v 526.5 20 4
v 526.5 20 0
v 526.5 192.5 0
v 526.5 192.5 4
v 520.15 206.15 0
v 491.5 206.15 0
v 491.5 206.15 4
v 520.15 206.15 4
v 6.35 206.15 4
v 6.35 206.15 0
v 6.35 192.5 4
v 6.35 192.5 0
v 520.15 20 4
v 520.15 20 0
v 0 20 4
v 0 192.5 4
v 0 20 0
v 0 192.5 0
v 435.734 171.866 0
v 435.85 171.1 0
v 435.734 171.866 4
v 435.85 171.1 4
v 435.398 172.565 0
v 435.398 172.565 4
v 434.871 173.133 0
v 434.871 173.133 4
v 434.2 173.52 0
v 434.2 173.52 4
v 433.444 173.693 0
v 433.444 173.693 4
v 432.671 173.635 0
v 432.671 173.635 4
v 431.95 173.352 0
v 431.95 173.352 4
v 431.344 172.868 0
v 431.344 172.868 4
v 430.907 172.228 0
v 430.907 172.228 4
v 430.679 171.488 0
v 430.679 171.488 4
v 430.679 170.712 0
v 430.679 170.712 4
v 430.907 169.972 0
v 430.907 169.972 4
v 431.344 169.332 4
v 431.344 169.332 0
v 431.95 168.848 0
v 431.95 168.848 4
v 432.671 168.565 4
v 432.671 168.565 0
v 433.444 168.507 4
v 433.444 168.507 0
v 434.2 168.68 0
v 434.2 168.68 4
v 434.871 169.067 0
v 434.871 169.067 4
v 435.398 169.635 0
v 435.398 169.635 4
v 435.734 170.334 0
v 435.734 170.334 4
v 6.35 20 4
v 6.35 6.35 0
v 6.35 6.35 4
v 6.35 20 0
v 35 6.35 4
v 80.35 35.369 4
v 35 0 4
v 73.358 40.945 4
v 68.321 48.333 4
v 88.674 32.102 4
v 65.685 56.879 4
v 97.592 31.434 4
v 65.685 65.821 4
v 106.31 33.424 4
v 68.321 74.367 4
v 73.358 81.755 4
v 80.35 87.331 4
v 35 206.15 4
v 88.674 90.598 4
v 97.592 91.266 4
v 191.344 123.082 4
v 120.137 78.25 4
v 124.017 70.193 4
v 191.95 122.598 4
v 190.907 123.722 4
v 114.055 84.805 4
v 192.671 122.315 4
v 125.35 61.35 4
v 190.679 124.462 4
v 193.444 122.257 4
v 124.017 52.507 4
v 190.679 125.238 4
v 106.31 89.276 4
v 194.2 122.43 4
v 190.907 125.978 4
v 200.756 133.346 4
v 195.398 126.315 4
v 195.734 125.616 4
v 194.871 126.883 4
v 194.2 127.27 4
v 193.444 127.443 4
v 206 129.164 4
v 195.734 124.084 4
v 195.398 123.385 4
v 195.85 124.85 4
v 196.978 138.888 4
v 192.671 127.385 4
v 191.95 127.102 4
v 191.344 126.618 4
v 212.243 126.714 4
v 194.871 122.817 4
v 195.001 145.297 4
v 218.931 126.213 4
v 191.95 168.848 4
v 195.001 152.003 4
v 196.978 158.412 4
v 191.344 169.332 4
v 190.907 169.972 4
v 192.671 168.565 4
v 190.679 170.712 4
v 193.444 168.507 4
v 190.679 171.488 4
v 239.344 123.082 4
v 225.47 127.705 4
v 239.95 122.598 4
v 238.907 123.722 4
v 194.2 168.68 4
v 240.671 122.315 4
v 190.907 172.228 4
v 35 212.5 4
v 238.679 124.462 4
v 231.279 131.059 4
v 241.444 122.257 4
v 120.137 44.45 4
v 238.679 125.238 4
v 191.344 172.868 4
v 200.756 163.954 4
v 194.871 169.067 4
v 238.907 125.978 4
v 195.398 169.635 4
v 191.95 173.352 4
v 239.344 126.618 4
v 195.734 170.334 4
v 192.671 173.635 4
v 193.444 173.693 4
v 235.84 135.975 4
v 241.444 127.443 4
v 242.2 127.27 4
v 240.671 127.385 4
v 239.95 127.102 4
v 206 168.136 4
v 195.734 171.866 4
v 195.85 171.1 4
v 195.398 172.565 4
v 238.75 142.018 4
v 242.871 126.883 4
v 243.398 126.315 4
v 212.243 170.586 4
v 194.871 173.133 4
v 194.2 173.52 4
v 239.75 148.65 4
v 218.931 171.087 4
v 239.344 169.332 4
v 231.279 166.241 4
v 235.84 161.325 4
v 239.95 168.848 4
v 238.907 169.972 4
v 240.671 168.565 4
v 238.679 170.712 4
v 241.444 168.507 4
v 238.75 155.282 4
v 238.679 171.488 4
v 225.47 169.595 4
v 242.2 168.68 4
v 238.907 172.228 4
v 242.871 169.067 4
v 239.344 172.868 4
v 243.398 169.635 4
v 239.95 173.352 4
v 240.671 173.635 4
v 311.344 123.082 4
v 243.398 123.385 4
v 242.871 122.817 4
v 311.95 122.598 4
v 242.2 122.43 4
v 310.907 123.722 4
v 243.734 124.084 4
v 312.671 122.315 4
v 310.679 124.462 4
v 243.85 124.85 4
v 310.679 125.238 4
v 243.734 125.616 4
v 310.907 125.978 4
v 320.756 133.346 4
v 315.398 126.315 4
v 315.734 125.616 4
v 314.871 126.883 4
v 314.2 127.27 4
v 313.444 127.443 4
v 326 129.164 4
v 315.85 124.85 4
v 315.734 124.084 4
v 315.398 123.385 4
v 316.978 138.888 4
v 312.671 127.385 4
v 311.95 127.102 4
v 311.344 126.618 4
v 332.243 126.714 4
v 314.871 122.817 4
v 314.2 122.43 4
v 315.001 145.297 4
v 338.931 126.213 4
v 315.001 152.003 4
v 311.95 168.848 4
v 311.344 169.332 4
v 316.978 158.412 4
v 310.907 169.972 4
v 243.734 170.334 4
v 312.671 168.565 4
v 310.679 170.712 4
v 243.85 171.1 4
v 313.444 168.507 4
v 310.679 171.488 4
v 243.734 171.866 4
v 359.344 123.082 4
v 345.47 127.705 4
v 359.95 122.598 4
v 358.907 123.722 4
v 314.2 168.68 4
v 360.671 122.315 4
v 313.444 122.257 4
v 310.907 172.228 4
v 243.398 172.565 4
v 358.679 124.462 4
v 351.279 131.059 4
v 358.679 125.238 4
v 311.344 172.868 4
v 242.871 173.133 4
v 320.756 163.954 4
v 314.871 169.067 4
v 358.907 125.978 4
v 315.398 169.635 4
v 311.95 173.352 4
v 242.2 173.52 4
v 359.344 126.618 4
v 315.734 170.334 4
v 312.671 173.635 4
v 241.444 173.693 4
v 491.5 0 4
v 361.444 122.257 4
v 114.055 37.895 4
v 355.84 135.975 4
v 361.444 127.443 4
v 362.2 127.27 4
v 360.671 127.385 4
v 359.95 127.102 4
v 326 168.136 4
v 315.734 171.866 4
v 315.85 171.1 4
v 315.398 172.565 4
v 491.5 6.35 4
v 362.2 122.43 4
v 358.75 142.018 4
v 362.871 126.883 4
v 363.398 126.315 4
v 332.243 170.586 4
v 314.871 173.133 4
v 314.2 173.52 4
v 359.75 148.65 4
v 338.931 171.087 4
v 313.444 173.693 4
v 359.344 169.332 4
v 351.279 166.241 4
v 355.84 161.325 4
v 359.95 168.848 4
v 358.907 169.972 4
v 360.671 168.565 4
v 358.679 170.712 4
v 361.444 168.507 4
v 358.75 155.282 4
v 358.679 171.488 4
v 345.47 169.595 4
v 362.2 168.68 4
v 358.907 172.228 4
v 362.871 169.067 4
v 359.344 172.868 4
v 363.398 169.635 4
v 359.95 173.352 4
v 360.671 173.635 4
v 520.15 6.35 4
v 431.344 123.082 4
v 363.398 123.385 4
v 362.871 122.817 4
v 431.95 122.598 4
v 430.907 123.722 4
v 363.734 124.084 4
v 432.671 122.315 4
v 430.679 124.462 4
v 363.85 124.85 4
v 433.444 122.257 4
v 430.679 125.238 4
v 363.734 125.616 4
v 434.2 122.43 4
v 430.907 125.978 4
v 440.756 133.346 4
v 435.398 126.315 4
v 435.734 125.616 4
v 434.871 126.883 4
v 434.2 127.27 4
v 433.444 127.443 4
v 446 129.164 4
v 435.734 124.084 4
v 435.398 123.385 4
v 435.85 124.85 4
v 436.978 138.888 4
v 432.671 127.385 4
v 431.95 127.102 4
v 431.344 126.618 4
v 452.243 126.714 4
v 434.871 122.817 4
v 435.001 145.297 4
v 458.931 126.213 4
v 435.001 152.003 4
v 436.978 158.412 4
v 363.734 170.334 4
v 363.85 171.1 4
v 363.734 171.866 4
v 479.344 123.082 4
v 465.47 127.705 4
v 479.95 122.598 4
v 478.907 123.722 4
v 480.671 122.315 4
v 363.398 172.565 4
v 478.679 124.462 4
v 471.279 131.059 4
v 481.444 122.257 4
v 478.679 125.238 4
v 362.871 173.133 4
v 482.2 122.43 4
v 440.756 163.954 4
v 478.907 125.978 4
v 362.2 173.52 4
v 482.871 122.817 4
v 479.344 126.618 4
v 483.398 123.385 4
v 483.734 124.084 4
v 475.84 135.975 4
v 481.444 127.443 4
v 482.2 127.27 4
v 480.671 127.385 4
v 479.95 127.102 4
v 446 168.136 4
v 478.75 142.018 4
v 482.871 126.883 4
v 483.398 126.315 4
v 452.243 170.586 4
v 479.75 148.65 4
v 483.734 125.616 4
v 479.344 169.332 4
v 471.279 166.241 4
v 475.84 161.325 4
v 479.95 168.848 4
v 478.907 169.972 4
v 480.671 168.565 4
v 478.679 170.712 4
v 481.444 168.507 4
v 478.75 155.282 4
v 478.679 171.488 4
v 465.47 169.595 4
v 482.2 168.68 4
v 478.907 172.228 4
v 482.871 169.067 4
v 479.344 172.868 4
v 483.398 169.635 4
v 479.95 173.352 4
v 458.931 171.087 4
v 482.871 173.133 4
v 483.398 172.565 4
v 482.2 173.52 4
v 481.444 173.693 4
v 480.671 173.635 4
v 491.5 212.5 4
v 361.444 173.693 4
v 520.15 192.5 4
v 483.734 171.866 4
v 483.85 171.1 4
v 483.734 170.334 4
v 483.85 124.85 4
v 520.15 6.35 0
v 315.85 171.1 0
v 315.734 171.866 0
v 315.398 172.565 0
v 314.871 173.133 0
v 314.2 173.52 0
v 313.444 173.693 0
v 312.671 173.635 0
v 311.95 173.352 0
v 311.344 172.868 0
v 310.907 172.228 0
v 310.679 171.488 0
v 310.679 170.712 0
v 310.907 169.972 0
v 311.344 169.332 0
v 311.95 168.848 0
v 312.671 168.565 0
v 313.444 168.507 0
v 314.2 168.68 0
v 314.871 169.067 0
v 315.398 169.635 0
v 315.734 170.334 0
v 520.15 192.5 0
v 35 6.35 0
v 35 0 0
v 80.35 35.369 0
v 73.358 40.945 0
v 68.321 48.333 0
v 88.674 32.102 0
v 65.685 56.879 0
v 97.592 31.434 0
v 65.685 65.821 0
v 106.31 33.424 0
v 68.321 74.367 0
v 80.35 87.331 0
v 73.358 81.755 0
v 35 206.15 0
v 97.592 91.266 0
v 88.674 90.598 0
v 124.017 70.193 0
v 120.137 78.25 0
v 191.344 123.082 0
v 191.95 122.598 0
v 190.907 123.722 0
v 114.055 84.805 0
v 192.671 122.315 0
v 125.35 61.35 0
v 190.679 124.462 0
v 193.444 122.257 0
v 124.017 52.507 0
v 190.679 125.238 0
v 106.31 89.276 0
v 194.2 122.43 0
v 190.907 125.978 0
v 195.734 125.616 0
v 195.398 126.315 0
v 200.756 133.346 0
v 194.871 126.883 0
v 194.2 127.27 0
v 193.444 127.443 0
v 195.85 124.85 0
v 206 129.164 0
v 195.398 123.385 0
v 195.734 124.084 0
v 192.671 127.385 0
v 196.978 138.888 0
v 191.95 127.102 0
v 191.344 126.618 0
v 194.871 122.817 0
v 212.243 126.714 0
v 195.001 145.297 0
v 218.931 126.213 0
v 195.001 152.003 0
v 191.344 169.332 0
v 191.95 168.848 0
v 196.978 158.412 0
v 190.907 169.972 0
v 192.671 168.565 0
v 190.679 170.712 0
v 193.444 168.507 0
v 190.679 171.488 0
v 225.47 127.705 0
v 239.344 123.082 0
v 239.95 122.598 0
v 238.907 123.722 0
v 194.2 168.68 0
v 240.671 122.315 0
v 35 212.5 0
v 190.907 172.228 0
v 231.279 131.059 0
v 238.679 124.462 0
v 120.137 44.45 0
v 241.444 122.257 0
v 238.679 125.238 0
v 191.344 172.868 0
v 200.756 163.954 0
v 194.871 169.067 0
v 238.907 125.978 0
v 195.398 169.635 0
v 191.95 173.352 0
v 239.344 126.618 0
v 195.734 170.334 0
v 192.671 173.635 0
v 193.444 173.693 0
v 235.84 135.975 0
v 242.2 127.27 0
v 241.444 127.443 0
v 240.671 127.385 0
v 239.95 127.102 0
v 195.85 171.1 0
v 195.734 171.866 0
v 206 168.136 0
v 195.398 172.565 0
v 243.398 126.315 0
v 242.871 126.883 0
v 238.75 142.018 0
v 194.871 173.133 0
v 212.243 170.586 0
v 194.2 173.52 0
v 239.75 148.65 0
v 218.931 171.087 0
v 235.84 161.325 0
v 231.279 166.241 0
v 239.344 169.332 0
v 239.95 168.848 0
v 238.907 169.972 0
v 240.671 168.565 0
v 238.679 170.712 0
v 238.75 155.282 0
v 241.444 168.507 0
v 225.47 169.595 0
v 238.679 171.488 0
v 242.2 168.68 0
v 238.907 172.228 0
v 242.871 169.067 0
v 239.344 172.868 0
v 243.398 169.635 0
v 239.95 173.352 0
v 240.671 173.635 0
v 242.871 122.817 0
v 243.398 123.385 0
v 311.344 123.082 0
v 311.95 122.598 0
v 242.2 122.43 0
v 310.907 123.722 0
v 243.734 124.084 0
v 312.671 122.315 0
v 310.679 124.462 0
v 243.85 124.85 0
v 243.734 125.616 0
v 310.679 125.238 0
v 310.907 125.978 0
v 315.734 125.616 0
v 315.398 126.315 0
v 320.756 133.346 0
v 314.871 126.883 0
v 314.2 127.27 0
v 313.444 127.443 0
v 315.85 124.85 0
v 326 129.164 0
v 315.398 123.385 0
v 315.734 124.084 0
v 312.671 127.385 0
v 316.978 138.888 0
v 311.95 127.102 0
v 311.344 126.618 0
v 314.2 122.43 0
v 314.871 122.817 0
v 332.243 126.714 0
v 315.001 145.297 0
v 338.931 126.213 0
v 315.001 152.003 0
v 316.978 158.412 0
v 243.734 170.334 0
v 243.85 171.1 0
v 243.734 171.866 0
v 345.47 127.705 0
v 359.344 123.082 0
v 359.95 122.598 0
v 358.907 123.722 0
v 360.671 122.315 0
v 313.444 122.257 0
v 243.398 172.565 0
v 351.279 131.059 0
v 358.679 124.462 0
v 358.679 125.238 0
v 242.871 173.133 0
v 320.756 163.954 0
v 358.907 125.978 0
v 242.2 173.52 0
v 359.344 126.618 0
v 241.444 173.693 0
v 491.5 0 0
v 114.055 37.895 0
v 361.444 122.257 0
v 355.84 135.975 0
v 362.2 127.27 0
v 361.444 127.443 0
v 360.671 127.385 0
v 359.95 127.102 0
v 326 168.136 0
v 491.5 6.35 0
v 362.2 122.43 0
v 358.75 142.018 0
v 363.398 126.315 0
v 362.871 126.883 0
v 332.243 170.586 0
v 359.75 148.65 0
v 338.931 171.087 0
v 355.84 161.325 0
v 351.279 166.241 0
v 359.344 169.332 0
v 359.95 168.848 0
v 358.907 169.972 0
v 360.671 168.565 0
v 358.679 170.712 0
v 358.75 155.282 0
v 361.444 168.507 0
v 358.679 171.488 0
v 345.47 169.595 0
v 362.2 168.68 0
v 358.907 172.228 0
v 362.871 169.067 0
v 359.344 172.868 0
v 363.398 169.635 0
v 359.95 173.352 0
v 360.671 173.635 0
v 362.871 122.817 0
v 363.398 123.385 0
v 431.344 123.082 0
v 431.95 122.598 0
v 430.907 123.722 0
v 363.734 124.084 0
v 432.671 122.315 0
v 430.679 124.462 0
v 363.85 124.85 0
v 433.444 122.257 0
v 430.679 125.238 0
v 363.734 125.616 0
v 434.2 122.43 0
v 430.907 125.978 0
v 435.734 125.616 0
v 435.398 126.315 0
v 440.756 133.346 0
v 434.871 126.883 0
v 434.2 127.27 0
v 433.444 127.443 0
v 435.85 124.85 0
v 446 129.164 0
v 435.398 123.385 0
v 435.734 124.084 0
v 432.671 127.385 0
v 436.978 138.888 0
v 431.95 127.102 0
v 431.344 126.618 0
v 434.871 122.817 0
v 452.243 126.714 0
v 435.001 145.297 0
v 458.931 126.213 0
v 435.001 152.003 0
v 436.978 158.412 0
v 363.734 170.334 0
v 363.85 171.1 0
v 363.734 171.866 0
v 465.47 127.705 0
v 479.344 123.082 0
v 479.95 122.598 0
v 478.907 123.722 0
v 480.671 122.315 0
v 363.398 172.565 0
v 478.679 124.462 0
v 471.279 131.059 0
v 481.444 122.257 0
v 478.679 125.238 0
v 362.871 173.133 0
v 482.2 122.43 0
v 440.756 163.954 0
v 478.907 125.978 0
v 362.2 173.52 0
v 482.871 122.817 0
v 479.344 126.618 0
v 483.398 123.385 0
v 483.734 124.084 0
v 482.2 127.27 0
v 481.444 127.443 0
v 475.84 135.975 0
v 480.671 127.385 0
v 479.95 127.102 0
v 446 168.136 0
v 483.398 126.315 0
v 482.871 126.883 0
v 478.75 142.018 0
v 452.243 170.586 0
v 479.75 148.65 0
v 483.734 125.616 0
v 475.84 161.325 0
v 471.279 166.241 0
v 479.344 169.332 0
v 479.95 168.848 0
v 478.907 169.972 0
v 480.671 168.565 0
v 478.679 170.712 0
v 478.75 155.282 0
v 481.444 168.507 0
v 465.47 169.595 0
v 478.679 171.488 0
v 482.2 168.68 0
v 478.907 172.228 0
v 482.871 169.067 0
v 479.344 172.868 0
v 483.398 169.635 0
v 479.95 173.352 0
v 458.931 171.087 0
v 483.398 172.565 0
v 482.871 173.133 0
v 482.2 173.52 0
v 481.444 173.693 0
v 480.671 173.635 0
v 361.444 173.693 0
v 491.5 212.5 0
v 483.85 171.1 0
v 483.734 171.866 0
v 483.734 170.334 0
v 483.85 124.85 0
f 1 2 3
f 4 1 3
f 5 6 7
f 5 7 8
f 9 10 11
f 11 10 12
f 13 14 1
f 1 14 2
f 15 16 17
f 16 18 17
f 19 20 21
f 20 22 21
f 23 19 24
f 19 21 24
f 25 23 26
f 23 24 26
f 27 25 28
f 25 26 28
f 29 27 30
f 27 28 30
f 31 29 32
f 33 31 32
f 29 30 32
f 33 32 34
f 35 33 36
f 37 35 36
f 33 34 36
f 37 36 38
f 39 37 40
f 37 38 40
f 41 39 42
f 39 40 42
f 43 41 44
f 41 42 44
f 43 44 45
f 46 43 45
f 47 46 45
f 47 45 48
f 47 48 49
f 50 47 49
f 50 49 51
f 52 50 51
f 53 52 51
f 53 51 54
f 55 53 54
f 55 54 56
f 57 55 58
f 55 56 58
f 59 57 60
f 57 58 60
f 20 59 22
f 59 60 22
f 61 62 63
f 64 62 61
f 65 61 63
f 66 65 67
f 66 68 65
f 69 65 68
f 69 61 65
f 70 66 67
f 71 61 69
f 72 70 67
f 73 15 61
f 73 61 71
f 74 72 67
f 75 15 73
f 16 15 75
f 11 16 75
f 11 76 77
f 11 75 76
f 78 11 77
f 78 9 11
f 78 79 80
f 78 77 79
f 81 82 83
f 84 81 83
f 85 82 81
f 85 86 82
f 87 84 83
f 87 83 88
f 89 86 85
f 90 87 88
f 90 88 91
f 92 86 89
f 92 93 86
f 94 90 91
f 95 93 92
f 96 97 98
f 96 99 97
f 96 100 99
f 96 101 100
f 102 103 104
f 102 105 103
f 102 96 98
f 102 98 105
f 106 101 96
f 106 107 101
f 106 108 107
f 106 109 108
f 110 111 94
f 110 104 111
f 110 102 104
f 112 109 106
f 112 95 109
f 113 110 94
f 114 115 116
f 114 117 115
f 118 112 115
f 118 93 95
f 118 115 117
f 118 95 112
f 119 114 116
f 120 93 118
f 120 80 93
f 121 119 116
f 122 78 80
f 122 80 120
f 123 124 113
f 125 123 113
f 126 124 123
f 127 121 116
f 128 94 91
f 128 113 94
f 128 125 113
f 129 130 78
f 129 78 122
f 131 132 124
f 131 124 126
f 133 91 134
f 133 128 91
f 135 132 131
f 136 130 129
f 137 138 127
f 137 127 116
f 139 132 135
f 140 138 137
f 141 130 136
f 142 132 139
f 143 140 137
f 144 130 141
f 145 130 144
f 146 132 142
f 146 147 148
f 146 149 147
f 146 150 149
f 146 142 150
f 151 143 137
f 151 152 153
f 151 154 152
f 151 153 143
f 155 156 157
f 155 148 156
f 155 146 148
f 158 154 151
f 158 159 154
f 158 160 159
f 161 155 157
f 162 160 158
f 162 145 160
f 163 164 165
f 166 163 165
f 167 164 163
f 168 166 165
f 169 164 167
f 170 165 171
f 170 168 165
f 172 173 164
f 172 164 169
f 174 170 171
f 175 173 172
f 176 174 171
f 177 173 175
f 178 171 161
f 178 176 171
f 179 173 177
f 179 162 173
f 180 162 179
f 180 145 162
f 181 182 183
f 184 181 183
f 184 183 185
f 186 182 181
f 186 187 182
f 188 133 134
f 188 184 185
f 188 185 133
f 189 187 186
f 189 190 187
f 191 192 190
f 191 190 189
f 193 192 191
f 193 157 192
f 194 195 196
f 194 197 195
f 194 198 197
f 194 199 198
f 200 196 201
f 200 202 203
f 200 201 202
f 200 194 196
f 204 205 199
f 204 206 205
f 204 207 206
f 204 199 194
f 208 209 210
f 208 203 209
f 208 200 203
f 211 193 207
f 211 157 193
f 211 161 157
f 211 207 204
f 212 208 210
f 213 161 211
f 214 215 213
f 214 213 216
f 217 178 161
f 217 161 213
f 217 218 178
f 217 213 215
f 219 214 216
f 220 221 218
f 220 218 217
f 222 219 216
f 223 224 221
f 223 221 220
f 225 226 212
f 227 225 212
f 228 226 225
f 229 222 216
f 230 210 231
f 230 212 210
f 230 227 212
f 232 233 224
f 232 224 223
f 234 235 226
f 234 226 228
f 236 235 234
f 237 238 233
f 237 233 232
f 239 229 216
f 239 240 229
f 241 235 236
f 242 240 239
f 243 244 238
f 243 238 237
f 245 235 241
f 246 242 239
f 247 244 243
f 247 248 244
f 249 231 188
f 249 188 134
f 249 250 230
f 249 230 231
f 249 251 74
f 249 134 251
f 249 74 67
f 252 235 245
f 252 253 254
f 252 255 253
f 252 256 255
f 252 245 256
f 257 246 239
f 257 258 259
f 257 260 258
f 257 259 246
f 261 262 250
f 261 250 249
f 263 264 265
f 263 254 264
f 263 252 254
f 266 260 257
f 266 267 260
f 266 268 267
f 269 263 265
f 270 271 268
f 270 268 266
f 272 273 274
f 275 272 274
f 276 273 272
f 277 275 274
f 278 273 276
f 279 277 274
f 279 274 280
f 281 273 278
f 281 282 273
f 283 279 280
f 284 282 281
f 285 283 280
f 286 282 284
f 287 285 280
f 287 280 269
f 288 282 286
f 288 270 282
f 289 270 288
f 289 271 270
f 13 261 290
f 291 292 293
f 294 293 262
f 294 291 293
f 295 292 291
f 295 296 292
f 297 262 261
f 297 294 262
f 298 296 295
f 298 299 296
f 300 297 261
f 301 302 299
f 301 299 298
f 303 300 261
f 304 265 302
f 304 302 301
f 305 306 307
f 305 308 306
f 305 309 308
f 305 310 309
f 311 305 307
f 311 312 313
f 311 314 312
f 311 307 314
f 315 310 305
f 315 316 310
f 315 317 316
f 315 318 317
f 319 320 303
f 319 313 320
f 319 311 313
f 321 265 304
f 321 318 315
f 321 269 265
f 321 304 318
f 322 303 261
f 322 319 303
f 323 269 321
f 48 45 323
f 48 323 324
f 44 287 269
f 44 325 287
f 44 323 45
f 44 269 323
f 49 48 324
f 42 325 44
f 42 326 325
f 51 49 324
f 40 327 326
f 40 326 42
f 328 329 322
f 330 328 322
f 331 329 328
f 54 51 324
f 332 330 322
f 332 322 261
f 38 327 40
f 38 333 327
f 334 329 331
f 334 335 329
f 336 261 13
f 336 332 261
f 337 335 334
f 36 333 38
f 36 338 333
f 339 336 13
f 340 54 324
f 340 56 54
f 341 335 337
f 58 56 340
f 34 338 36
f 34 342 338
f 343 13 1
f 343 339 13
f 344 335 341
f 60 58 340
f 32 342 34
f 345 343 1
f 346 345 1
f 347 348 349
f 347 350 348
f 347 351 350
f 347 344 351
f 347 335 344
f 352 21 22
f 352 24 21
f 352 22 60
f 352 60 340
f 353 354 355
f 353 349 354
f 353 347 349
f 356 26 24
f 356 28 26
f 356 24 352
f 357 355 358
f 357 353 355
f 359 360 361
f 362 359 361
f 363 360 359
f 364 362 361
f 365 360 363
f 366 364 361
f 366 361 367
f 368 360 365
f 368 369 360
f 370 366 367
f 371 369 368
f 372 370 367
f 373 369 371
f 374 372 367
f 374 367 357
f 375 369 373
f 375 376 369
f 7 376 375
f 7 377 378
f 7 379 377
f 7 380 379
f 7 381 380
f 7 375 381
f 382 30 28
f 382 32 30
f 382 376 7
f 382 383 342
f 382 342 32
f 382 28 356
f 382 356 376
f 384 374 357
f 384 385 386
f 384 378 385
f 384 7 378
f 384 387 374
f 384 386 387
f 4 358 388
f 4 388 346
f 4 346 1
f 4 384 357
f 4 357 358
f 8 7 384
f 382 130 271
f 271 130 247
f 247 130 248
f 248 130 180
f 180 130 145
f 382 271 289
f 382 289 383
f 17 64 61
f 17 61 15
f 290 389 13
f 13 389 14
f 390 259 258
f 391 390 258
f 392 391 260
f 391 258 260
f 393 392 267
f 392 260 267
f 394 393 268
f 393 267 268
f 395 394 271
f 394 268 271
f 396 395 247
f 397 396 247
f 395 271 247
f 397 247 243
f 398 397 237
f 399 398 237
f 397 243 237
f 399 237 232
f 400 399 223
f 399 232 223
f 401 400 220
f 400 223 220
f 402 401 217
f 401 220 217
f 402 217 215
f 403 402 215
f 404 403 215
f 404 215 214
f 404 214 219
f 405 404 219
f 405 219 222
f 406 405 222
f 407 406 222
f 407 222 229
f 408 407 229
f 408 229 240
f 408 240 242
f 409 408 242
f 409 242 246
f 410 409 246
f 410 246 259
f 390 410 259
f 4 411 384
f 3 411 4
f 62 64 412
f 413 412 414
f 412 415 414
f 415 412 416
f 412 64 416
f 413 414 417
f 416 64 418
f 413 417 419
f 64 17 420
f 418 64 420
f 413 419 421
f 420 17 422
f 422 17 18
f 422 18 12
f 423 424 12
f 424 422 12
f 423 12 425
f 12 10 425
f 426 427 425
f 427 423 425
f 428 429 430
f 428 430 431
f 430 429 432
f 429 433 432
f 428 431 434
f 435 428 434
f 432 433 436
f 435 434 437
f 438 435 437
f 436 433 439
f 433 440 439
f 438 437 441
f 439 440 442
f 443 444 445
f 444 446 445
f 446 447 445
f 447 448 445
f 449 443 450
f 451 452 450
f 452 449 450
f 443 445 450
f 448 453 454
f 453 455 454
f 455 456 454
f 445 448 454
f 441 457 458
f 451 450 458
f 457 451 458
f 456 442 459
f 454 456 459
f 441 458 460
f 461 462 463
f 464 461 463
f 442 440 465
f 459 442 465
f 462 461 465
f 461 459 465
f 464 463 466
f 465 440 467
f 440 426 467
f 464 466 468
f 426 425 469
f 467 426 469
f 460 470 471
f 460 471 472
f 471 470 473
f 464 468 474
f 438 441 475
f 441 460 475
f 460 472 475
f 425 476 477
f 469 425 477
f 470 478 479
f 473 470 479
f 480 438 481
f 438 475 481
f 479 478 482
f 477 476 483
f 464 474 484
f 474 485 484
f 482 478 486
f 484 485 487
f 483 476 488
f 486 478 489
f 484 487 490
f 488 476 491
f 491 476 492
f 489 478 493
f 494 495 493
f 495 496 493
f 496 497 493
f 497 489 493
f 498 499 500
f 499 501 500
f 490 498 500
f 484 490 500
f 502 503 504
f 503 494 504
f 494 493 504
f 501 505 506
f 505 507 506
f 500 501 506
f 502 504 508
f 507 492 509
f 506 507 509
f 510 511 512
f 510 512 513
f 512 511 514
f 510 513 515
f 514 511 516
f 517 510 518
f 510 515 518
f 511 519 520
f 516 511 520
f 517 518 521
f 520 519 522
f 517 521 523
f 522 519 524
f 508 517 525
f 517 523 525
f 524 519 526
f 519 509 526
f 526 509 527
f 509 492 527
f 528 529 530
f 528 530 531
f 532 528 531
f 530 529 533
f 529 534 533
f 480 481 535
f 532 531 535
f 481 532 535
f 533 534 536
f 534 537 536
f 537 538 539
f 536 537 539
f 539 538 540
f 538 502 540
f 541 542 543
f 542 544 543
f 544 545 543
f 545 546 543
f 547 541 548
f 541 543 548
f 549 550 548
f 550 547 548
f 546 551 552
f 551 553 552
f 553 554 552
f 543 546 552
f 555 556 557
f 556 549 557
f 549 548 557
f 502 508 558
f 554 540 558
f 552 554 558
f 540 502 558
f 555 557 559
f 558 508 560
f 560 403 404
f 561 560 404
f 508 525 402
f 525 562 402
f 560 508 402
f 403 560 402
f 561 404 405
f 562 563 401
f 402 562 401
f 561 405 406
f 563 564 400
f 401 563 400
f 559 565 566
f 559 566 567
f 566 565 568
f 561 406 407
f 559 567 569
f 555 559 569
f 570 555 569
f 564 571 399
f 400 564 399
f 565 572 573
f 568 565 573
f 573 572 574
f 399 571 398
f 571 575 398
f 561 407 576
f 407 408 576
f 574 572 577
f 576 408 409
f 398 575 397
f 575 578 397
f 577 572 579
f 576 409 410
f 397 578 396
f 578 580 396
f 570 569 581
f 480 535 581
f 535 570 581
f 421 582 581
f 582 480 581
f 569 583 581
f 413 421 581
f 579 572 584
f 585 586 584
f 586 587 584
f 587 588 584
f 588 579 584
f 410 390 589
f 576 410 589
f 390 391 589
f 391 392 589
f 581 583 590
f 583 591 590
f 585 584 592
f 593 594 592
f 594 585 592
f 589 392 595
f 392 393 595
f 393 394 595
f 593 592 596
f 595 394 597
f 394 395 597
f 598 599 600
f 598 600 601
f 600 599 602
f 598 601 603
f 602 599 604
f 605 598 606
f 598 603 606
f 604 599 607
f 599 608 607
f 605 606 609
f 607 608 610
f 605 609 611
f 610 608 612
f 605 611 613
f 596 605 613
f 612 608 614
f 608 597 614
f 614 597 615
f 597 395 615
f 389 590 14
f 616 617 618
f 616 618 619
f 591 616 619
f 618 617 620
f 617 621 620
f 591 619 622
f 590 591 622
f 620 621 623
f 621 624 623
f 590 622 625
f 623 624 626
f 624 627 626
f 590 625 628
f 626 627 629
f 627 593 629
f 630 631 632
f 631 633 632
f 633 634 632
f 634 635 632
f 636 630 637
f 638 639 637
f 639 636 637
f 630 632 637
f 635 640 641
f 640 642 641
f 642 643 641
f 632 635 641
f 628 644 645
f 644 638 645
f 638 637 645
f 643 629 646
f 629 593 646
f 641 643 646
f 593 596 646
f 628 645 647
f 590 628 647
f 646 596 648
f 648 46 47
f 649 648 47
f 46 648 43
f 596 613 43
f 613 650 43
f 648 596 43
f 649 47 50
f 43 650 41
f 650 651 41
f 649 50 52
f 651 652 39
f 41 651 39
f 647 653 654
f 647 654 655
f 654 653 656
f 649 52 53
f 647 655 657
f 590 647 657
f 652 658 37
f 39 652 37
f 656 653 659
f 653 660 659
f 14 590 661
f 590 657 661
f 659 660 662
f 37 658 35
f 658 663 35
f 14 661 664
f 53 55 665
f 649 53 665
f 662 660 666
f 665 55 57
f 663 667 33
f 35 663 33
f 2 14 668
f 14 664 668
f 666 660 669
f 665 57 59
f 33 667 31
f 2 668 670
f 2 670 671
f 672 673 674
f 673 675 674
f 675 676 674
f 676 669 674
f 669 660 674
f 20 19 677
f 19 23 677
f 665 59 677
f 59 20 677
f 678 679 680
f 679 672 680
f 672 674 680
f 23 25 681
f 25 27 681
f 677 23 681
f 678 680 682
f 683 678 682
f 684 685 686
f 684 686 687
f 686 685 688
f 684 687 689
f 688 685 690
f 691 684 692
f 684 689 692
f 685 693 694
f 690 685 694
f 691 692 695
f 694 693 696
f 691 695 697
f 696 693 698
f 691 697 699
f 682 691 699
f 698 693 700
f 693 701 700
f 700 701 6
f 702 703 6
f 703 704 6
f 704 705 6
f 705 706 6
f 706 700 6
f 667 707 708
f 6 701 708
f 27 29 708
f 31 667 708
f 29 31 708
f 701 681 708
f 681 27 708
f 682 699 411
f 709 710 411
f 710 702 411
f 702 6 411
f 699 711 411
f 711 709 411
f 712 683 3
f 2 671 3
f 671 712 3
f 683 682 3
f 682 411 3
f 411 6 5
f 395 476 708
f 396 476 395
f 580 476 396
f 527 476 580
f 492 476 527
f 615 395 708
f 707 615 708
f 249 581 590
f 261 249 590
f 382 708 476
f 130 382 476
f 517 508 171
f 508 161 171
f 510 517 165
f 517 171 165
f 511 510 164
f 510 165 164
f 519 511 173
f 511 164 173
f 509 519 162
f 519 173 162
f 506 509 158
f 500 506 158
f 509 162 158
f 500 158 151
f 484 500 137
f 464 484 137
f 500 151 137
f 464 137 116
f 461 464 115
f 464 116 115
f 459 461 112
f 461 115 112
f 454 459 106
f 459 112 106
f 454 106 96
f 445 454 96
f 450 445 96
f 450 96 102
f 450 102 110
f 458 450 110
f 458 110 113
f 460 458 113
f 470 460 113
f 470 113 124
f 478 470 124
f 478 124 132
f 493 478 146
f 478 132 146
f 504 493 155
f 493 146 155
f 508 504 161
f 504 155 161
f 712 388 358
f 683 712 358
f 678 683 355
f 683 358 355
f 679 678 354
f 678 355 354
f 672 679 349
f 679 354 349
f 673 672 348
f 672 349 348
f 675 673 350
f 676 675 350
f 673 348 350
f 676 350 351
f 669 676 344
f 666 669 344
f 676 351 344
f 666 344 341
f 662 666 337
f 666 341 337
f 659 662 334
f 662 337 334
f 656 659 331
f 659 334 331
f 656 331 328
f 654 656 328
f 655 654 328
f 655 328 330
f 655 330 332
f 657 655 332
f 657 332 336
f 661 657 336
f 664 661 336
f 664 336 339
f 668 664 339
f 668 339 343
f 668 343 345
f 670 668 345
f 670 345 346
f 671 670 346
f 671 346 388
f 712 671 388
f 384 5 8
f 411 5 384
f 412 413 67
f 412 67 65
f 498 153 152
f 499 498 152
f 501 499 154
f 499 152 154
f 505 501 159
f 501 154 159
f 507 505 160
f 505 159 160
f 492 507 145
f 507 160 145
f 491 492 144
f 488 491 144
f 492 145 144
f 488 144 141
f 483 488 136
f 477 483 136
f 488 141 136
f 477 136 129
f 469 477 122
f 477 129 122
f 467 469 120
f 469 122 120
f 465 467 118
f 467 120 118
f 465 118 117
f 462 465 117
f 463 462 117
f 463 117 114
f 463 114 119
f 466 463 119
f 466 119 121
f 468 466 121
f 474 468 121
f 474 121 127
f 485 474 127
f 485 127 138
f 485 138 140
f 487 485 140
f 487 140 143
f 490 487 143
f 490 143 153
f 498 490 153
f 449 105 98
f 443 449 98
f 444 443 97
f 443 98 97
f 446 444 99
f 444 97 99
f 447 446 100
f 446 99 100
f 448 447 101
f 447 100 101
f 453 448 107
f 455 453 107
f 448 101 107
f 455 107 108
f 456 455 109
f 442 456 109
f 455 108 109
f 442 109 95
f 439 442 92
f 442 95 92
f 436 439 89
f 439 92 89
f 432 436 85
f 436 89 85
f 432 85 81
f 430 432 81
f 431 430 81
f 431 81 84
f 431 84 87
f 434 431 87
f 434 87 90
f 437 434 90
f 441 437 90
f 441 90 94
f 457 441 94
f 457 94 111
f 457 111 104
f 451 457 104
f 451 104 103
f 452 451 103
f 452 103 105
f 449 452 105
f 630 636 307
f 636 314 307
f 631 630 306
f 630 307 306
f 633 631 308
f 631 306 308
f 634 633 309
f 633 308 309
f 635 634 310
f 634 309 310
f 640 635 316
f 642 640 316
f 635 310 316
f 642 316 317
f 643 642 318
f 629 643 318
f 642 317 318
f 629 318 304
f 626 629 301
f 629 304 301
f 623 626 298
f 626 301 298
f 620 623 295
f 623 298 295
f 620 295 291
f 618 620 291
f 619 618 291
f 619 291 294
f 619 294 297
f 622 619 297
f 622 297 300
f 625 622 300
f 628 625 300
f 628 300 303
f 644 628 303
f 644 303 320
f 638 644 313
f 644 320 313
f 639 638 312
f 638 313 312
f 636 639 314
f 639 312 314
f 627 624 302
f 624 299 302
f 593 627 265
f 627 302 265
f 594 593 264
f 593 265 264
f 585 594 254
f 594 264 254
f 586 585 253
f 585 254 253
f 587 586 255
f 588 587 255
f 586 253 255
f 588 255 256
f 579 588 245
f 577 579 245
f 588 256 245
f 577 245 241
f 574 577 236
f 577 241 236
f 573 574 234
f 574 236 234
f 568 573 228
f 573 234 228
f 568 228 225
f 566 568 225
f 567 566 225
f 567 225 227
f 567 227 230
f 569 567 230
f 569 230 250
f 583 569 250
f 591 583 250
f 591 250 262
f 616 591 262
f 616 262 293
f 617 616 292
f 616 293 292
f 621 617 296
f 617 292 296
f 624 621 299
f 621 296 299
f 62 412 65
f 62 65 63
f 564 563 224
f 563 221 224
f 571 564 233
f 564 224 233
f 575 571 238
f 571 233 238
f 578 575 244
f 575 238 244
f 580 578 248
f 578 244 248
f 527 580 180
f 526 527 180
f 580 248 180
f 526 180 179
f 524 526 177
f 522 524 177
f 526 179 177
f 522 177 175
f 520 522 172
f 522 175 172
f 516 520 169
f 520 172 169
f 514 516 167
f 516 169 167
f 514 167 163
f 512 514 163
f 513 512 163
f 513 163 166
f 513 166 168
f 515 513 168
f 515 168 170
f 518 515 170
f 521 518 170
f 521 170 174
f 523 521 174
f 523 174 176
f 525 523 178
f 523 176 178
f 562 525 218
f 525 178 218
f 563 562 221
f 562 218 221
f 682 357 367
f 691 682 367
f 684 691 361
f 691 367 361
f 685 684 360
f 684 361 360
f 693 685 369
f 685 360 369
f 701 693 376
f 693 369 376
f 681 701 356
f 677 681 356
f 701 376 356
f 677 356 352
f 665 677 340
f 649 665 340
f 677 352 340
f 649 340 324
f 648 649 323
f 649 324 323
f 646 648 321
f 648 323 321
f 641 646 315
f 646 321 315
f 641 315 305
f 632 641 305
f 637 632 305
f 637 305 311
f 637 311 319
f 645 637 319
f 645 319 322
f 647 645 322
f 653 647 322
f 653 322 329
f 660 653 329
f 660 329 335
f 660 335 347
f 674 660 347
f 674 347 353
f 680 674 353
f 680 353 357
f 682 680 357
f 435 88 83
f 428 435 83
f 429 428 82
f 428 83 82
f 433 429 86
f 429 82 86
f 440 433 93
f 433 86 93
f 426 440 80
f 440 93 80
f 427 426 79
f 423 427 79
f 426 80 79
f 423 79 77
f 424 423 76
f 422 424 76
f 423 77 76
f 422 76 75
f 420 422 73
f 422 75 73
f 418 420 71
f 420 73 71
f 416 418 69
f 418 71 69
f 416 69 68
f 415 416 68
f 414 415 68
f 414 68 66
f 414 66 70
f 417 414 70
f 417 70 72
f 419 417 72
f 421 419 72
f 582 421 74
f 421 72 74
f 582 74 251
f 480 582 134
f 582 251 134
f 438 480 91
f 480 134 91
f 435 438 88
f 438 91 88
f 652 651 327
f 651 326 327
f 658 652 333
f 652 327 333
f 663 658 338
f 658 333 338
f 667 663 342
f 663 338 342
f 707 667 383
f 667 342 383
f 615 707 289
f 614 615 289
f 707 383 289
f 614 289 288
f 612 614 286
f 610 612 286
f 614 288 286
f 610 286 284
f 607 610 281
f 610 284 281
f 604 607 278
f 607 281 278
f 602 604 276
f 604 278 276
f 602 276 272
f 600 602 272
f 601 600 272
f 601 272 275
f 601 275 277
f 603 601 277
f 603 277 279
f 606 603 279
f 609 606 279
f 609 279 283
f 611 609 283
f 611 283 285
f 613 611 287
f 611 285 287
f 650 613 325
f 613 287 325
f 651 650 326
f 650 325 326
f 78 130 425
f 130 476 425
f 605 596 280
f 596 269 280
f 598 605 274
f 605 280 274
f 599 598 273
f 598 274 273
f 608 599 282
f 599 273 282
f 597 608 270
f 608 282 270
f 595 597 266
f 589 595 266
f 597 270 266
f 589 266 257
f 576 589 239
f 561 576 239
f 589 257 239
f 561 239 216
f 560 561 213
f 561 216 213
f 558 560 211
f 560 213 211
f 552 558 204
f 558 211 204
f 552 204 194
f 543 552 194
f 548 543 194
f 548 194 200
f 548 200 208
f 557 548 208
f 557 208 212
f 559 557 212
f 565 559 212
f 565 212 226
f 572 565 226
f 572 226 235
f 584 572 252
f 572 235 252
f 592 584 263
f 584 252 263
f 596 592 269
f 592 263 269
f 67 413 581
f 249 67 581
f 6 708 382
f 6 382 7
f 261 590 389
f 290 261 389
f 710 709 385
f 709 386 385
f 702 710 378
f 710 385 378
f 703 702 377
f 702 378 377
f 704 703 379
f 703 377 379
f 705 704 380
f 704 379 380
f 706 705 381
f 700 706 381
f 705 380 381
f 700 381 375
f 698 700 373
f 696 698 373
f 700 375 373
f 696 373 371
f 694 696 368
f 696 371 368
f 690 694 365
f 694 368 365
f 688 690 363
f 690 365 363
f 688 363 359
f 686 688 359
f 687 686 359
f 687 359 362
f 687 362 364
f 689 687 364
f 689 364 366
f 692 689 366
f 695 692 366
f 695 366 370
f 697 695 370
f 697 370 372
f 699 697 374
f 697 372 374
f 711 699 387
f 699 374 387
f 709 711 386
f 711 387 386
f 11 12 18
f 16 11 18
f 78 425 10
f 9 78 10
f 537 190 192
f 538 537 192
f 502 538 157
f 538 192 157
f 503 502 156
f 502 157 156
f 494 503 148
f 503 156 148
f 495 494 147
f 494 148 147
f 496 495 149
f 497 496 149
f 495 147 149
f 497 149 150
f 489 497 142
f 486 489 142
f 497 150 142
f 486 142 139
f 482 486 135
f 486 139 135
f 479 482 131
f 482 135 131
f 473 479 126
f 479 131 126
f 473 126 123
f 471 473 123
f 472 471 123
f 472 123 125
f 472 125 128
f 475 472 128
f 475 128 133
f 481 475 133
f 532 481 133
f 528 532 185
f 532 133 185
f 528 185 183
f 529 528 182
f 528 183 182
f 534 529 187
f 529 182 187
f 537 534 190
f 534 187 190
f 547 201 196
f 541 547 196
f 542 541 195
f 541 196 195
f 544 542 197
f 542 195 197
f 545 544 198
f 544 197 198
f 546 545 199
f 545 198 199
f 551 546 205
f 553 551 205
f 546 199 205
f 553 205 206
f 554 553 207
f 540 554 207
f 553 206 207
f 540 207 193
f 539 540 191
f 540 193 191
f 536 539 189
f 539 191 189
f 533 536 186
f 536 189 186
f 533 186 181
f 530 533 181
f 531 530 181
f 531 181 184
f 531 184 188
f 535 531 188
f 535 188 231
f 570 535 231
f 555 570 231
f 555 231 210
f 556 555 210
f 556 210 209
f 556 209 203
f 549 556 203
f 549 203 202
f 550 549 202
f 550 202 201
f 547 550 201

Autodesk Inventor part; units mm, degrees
ref_plane "YZ Plane" through (0, 0, 0) normal (1, 0, 0) x (0, 1, 0)
ref_plane "XZ Plane" through (0, 0, 0) normal (0, 1, 0) x (-1, 0, 0)
ref_plane "XY Plane" through (0, 0, 0) normal (0, 0, 1) x (1, 0, 0)
sketch "Skizze1" plane through (0, 0, 0) normal (0, 0, 1) x (1, 0, 0)
  line L0 (0, 0) -> (526.5, 0)
  line L1 (526.5, 0) -> (526.5, 212.5)
  line L2 (526.5, 212.5) -> (0, 212.5)
  line L3 (0, 212.5) -> (0, 0)
  line L4 (0, 212.5) -> (35, 212.5)
  line L5 (35, 212.5) -> (35, 206.15)
  line L6 (35, 206.15) -> (0, 206.15)
  line L7 (0, 206.15) -> (0, 212.5)
  line L8 (0, 212.5) -> (6.35, 212.5)
  line L9 (6.35, 212.5) -> (6.35, 192.5)
  line L10 (6.35, 192.5) -> (0, 192.5)
  line L11 (0, 192.5) -> (0, 212.5)
  line L12 (0, 106.25) -> (526.5, 106.25) construction
  line L13 (263.25, 212.5) -> (263.25, 0) construction
  line L14 (0, 0) -> (35, 0)
  line L15 (35, 0) -> (35, 6.35)
  line L16 (35, 6.35) -> (0, 6.35)
  line L17 (0, 6.35) -> (0, 0)
  line L18 (0, 0) -> (6.35, 0)
  line L19 (6.35, 0) -> (6.35, 20)
  line L20 (6.35, 20) -> (0, 20)
  line L21 (0, 20) -> (0, 0)
  line L22 (526.5, 212.5) -> (526.5, 0)
  line L23 (526.5, 212.5) -> (491.5, 212.5)
  line L24 (491.5, 212.5) -> (491.5, 206.15)
  line L25 (491.5, 206.15) -> (526.5, 206.15)
  line L26 (526.5, 206.15) -> (526.5, 212.5)
  line L27 (526.5, 212.5) -> (520.15, 212.5)
  line L28 (520.15, 212.5) -> (520.15, 192.5)
  line L29 (520.15, 192.5) -> (526.5, 192.5)
  line L30 (526.5, 192.5) -> (526.5, 212.5)
  line L31 (526.5, 0) -> (520.15, 0)
  line L32 (526.5, 0) -> (491.5, 0)
  line L33 (491.5, 0) -> (491.5, 6.35)
  line L34 (491.5, 6.35) -> (526.5, 6.35)
  line L35 (520.15, 0) -> (520.15, 20)
  line L36 (526.5, 6.35) -> (526.5, 0)
  line L37 (520.15, 20) -> (526.5, 20)
  line L38 (526.5, 20) -> (526.5, 0)
  point P0 (526.5, 192.5)
  point P1 (520.15, 206.15)
  point P2 (491.5, 212.5)
  point P3 (6.35, 206.15)
  point P4 (0, 192.5)
  point P5 (0, 20)
  point P6 (6.35, 6.35)
  point P7 (491.5, 0)
  point P8 (520.15, 6.35)
  point P9 (526.5, 20)
  dimension "d0" = 526.5
  dimension "d1" = 212.5
  dimension "d2" = 35
  dimension "d3" = 6.35
  dimension "d4" = 6.35
  dimension "d5" = 20
extrude "Extrusion1" add sketch "Skizze1" along normal blind 4 contours L15 L16 L19 L20 L3 L10 L9 L6 L5 L2 L24 L25 L28 L29 L1 L37 L35 L34 L33 L0
sketch "Skizze3" plane through (0, 0, 4) normal (0, 0, 1) x (1, 0, 0)
  circle A0 centre (217.25, 148.65) radius 22.5
  circle A1 centre (337.25, 148.65) radius 22.5
  circle A2 centre (457.25, 148.65) radius 22.5
  circle A3 centre (95.35, 61.35) radius 30
  line L0 (520.15, 206.15) -> (491.5, 206.15) projected
  line L1 (520.15, 192.5) -> (520.15, 206.15) projected
  line L2 (6.35, 20) -> (6.35, 6.35) projected
  line L3 (6.35, 6.35) -> (35, 6.35) projected
  point P0 (0, 0)
  dimension "d19" = 45
  dimension "d20" = 45
  dimension "d21" = 45
  dimension "d22" = 60
  dimension "d23" = 120
  dimension "d24" = 120
  dimension "d25" = 57.5
  dimension "d26" = 62.9
  dimension "d27" = 89
  dimension "d28" = 55
extrude "Extrusion3" cut sketch "Skizze3" against normal blind 10
sketch "Skizze4" plane through (0, 0, 4) normal (0, 0, 1) x (1, 0, 0)
  circle A0 centre (193.25, 171.1) radius 2.6
  circle A1 centre (241.25, 171.1) radius 2.6
  circle A2 centre (241.25, 124.85) radius 2.6
  circle A3 centre (193.25, 124.85) radius 2.6
  circle A4 centre (217.25, 148.65) radius 22.5 projected
  line L0 (491.5, 212.5) -> (35, 212.5) projected
  line L1 (277.25, 212.5) -> (277.25, 70.6491) construction
  line L2 (397.25, 212.5) -> (397.25, 70.6491) construction
  circle A5 centre (337.25, 148.65) radius 22.5 projected
  circle A6 centre (361.25, 171.1) radius 2.6
  circle A7 centre (313.25, 171.1) radius 2.6
  circle A8 centre (313.25, 124.85) radius 2.6
  circle A9 centre (361.25, 124.85) radius 2.6
  circle A10 centre (481.25, 171.1) radius 2.6
  circle A11 centre (481.25, 124.85) radius 2.6
  circle A12 centre (433.25, 171.1) radius 2.6
  circle A13 centre (433.25, 124.85) radius 2.6
  point P0 (0, 0)
  point P1 (337.25, 148.65)
  point P2 (457.25, 148.65)
  point P3 (457.25, 148.65)
  dimension "d31" = 5.2
  dimension "d32" = 5.2
  dimension "d33" = 5.2
  dimension "d34" = 5.2
  dimension "d35" = 48
  dimension "d36" = 46.25
  dimension "d37" = 24
  dimension "d38" = 24
  dimension "d39" = 22.45
  dimension "d40" = 23.8
  dimension "d43" = 60
  dimension "d44" = 60
extrude "Extrusion4" cut sketch "Skizze4" against normal blind 10 contours A0 | A1 | A2 | A3 | A6 | A7 | A8 | A9 | A10 | A11 | A12 | A13
properties part number "103.015.01_Abdeckung_Gestell_oben" material "PMMA-Kunststoff"
